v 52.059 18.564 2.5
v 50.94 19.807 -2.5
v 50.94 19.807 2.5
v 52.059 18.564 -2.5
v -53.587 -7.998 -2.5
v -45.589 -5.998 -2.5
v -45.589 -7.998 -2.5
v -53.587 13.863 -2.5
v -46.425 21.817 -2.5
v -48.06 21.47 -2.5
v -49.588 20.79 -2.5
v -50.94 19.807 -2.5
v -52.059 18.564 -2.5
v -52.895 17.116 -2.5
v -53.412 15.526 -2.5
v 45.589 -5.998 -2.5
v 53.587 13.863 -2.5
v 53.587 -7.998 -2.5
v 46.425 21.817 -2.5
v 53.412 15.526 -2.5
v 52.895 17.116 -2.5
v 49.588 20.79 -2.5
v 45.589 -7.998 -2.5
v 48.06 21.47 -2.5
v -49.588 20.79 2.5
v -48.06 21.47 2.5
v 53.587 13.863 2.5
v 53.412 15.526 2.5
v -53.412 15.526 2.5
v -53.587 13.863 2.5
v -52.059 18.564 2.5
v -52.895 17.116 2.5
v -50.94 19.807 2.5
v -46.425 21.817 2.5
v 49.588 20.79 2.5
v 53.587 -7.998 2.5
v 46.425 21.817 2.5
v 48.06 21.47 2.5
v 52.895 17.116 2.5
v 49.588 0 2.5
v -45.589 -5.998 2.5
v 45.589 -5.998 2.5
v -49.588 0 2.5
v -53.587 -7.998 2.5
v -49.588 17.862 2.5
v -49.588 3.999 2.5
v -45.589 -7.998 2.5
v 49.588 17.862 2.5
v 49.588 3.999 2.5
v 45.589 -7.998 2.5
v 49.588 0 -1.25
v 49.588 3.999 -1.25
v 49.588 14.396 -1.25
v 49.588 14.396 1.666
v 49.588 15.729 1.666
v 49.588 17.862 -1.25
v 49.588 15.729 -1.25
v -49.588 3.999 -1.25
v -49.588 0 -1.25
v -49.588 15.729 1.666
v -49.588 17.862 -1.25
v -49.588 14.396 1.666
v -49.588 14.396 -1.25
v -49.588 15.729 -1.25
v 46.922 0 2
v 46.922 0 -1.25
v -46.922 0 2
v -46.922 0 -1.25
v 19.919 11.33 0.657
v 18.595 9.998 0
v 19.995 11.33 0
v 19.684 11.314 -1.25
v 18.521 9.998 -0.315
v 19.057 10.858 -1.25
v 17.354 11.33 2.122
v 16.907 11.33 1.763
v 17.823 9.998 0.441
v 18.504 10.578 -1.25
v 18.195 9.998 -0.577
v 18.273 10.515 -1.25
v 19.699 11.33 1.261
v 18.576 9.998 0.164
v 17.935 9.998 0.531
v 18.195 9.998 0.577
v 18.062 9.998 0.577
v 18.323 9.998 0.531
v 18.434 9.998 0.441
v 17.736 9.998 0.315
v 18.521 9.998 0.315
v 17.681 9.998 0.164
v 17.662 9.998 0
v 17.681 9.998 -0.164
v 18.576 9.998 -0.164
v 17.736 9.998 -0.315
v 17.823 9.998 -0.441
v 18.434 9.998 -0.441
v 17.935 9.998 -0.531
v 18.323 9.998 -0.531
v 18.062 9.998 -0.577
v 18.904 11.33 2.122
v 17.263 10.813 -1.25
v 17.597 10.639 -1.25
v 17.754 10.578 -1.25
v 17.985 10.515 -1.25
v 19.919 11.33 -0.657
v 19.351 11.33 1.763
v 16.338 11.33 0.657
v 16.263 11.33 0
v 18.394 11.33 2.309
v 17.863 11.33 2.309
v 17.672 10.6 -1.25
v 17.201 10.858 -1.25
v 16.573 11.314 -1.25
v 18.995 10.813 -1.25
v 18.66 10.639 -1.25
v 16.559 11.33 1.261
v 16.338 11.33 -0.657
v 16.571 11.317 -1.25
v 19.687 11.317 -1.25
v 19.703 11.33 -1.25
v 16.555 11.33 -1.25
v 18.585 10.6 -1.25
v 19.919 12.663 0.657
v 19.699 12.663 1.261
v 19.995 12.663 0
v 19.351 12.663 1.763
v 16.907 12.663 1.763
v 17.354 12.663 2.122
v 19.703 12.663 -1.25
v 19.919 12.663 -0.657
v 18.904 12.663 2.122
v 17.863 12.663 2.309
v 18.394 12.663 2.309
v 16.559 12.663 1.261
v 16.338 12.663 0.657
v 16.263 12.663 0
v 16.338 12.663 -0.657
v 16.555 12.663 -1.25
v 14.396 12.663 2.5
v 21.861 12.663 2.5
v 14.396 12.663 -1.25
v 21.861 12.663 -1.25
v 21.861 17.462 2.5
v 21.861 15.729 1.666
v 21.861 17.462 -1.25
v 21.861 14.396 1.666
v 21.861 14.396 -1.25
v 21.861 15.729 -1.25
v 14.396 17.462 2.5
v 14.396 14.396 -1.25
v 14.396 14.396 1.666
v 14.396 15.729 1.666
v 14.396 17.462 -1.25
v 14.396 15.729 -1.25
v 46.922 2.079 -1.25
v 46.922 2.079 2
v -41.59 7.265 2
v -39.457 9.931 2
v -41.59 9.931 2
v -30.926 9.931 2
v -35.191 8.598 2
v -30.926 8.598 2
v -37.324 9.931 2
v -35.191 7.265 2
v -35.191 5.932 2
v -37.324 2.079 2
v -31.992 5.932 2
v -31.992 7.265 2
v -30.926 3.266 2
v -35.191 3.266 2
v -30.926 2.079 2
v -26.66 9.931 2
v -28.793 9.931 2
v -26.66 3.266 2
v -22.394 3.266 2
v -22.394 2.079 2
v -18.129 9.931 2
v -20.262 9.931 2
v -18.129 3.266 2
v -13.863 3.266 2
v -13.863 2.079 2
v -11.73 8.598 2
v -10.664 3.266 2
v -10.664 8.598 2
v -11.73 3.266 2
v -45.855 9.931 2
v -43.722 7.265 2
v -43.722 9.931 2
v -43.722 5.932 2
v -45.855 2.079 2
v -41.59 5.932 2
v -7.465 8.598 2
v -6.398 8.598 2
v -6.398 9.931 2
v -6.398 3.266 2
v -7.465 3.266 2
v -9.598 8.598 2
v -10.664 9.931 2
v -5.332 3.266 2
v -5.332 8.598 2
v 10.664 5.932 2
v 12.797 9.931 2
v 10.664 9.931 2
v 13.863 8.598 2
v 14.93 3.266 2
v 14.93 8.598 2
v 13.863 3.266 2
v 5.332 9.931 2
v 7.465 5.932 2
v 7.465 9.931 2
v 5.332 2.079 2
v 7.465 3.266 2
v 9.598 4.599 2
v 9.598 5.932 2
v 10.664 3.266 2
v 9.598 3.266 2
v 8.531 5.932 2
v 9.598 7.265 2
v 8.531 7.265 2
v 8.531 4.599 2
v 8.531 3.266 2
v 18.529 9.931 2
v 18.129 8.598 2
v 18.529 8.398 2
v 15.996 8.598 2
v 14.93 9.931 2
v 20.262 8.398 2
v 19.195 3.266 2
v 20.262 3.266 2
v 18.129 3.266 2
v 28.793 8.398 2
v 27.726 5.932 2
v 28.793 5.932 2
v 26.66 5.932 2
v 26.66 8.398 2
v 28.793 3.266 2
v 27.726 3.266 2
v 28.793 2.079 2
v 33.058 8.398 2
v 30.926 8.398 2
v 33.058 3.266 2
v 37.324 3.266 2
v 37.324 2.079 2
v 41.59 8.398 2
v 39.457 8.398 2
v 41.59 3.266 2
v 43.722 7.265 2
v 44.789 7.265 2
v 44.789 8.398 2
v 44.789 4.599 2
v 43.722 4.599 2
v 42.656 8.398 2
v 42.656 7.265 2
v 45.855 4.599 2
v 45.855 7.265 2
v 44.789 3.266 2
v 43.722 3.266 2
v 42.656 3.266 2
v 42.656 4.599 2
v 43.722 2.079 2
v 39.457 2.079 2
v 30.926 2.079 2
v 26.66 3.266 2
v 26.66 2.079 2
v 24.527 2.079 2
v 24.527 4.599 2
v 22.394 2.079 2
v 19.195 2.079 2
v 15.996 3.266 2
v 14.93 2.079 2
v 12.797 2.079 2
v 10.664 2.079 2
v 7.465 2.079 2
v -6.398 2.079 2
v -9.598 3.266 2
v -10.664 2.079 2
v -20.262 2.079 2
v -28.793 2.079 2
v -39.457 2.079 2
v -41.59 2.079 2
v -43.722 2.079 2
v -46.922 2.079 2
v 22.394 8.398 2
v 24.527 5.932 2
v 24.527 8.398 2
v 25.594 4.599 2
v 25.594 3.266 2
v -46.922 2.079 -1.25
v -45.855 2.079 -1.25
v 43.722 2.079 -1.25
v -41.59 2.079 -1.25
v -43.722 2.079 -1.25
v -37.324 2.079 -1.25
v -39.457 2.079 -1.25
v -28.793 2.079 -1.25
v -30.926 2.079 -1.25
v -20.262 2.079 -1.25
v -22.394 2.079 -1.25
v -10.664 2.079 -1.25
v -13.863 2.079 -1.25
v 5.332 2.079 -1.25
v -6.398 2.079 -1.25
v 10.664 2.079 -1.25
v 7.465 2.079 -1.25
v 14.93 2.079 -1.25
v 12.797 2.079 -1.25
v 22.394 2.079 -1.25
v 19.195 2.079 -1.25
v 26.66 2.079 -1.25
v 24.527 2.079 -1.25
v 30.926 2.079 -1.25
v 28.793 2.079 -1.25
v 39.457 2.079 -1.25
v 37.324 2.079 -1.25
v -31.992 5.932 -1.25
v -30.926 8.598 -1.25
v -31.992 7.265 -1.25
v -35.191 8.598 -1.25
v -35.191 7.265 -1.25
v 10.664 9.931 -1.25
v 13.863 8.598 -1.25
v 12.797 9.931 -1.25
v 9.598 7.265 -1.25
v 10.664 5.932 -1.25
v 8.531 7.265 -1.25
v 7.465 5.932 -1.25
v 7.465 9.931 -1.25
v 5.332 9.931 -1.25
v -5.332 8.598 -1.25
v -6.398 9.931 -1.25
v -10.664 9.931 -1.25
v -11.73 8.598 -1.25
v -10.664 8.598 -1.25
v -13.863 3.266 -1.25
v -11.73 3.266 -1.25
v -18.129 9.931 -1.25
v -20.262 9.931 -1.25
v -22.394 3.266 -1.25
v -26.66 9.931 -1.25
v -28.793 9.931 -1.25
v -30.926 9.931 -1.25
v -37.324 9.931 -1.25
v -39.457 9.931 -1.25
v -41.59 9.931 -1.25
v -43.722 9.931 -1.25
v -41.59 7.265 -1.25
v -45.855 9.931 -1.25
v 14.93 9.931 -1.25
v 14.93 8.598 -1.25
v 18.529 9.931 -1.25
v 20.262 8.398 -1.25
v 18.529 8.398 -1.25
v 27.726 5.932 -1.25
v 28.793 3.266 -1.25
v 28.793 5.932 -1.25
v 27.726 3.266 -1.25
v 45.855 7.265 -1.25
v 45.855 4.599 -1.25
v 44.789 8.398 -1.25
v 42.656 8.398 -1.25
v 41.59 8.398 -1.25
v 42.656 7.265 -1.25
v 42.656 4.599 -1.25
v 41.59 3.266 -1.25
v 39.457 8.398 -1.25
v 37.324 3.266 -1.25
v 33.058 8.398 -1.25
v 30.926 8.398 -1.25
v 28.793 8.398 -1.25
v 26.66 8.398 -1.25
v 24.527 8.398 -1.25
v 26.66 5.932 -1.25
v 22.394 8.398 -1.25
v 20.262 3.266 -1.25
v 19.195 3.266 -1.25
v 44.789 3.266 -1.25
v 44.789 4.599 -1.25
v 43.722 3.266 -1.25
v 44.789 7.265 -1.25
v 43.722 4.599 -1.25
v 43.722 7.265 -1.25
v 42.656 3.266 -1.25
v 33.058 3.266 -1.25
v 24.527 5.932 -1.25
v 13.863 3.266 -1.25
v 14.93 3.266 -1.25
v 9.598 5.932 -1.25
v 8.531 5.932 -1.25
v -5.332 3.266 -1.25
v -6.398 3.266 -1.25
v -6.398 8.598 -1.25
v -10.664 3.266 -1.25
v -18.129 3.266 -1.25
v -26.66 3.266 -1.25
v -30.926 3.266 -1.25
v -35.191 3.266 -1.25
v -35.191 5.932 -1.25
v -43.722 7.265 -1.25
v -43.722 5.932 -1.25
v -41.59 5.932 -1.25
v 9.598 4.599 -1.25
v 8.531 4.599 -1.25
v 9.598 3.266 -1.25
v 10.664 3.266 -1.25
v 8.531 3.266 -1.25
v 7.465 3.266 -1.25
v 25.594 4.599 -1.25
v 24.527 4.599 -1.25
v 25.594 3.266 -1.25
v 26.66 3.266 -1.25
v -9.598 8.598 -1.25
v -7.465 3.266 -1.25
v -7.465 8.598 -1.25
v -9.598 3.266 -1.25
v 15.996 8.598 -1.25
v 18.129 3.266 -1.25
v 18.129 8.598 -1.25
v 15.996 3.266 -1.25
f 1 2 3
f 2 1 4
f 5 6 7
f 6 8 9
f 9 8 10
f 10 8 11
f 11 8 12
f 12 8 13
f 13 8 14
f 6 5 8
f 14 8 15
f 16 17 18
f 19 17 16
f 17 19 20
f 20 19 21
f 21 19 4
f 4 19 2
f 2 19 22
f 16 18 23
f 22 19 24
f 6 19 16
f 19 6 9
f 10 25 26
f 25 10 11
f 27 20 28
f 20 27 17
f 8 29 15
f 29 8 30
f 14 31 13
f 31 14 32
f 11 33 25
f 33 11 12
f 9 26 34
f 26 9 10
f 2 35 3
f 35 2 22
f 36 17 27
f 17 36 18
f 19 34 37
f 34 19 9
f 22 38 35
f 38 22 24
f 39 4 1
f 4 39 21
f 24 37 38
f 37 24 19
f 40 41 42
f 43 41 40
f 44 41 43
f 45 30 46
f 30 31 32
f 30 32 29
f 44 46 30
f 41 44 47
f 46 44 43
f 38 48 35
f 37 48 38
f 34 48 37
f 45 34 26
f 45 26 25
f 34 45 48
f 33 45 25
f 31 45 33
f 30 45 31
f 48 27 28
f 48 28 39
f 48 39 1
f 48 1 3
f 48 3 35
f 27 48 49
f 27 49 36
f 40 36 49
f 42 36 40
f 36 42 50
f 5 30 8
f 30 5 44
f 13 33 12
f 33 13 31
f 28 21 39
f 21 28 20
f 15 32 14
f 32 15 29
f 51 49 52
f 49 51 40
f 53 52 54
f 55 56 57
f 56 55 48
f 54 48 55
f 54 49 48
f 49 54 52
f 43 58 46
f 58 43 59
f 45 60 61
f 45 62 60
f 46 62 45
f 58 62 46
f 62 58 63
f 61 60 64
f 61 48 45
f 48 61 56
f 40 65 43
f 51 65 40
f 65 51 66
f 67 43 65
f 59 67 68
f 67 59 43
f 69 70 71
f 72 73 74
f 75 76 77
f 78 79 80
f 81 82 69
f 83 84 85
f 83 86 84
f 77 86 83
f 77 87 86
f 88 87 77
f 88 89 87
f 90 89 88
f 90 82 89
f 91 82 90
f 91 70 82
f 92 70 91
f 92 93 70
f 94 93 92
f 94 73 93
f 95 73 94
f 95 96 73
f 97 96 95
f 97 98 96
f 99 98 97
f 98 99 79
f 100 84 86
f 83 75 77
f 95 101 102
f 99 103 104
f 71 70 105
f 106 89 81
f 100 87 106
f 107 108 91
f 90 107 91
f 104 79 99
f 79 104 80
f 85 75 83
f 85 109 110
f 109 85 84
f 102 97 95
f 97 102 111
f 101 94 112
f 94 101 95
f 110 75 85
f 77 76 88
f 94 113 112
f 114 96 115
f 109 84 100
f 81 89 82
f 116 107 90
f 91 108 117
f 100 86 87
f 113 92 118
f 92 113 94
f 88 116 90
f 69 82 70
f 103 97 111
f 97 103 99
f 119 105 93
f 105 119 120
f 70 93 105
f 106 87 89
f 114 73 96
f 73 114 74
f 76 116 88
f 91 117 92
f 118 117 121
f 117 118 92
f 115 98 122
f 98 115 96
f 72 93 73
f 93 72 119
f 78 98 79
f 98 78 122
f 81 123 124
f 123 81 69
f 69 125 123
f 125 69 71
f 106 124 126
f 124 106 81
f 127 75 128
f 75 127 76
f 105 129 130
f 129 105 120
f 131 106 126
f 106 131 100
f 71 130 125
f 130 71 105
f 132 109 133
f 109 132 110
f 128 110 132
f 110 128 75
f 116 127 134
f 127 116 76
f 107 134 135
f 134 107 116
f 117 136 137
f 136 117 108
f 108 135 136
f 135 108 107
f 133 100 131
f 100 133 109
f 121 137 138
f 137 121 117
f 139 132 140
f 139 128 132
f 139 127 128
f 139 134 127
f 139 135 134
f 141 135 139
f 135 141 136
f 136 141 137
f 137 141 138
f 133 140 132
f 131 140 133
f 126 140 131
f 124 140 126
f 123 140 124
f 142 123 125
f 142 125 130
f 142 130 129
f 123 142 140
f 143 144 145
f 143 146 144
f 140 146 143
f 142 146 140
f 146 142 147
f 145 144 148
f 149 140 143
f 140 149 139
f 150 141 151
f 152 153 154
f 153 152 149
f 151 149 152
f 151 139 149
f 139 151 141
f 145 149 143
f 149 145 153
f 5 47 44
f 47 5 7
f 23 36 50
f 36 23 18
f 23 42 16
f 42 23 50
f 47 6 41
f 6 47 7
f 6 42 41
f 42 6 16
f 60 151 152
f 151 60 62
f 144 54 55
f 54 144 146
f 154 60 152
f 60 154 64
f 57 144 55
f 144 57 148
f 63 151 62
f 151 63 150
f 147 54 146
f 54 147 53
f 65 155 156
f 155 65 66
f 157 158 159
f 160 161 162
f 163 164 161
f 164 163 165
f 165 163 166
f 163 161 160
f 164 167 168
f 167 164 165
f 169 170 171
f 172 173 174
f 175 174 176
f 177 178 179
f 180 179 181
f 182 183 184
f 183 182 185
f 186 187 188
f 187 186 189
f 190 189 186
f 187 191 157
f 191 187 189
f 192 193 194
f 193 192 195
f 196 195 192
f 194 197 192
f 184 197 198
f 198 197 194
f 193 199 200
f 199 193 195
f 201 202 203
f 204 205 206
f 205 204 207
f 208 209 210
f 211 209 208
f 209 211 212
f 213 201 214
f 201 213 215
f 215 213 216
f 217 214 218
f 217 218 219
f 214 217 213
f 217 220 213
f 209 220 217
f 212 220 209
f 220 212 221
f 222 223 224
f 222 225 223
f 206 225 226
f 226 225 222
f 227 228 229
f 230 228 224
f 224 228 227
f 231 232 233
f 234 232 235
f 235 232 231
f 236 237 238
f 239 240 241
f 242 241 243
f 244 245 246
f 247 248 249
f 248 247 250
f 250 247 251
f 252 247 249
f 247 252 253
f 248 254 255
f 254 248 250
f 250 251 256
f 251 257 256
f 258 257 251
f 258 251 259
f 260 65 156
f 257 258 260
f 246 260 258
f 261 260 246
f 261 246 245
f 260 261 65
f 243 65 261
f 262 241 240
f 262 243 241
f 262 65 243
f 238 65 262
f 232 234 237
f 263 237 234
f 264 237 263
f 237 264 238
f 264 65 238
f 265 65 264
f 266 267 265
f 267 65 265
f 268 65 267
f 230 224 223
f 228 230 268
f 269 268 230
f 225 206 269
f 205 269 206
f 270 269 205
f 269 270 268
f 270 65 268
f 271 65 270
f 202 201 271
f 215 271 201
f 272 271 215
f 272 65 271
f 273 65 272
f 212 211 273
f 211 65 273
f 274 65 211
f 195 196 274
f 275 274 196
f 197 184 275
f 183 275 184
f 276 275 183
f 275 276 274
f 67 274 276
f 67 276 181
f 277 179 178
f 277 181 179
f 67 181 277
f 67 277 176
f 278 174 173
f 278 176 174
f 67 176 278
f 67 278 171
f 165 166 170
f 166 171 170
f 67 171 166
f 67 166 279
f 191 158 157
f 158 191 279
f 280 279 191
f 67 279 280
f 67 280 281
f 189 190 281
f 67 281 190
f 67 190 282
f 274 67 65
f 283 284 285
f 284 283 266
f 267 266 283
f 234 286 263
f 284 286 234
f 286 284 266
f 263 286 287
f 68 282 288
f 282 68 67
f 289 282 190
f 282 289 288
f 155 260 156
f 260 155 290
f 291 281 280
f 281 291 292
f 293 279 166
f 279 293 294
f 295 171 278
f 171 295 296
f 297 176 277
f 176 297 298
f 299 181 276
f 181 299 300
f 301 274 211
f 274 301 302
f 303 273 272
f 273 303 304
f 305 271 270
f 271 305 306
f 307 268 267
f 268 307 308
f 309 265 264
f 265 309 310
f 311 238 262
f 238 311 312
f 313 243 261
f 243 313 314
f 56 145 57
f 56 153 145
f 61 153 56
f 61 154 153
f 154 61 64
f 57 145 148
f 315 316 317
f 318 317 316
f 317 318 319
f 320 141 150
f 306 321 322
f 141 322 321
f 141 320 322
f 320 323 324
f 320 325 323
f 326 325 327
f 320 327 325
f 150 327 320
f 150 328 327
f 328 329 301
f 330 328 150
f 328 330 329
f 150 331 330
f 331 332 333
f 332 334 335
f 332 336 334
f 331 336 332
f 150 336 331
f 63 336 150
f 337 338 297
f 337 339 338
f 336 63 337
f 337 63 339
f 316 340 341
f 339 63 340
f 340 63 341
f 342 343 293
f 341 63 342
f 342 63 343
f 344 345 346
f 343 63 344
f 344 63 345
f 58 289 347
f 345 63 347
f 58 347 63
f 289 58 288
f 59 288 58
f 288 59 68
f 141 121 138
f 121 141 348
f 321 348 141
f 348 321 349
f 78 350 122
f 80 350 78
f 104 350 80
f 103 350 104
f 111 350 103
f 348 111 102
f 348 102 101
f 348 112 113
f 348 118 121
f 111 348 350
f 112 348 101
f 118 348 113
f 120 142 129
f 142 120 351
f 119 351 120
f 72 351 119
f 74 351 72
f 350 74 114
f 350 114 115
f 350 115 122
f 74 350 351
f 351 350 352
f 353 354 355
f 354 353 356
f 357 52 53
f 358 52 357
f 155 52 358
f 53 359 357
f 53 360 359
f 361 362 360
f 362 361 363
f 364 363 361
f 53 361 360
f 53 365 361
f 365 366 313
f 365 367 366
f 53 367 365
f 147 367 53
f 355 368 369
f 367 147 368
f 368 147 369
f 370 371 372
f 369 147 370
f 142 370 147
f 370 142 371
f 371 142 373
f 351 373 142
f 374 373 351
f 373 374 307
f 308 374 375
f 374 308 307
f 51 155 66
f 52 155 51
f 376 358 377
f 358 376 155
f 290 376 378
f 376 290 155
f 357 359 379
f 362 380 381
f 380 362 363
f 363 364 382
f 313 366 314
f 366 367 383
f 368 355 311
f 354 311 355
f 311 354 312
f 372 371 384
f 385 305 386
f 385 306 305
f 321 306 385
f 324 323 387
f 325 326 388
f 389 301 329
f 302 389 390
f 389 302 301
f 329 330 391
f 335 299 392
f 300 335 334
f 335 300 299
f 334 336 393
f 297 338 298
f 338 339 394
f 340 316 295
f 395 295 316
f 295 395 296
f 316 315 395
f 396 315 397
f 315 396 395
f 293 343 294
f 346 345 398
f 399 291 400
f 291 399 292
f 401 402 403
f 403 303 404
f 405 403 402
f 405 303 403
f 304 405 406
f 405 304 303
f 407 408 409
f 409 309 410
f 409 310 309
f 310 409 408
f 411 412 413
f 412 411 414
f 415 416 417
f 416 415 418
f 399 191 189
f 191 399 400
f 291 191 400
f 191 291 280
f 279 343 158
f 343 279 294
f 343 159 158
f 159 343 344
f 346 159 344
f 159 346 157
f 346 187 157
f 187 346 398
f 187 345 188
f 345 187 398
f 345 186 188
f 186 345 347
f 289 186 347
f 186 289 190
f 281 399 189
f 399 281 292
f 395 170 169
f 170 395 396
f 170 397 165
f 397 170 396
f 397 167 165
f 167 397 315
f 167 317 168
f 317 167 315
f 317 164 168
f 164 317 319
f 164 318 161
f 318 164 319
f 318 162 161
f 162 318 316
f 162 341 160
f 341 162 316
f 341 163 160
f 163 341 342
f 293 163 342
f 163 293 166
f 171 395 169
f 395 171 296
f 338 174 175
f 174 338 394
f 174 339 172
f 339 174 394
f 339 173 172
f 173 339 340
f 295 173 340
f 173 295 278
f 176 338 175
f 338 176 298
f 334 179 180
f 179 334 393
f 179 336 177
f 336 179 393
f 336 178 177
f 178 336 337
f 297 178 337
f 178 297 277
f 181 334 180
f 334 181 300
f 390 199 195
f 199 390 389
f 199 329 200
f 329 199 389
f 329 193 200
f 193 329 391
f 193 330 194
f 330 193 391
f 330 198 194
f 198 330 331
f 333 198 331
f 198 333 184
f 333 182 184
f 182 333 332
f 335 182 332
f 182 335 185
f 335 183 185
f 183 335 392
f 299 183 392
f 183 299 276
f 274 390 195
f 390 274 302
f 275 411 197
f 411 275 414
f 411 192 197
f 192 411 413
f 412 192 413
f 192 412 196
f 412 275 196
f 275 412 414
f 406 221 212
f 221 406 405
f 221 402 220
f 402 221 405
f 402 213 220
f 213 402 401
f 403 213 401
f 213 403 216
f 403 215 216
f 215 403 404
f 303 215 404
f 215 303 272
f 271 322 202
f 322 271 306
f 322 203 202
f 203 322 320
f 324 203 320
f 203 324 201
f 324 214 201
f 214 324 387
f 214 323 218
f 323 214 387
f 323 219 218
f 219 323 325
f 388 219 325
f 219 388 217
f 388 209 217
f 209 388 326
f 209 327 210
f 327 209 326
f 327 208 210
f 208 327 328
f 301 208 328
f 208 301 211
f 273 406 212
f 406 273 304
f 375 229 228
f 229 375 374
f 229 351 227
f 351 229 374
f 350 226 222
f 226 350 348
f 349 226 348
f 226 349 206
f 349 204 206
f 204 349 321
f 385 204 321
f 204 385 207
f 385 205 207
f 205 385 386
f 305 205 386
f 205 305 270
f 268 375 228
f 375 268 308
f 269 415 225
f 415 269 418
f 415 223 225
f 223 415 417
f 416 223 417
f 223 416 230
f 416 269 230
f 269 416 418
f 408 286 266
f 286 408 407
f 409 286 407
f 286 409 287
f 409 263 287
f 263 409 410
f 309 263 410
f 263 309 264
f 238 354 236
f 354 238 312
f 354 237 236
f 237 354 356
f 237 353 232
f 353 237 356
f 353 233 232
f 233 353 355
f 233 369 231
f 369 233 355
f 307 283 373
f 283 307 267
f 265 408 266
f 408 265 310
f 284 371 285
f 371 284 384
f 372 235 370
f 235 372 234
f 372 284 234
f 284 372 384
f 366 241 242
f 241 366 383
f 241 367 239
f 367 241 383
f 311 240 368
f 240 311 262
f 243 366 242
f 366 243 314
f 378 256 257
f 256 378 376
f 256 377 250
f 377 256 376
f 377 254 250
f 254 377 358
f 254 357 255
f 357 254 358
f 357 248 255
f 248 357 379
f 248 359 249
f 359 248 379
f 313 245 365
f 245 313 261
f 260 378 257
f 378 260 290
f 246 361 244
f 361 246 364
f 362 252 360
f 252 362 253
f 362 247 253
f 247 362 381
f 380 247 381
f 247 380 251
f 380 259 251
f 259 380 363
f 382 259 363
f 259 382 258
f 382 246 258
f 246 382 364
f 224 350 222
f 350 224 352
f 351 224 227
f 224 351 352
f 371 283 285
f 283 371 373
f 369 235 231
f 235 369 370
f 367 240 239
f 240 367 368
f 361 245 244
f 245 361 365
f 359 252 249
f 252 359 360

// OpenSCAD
// Copyright 2013 Glen Chung
// This file is licensed Creative Commons Attribution-ShareAlike 3.0.
// http://creativecommons.org/licenses/by-sa/3.0/legalcode

use <MCAD/shapes.scad>
use <MCAD/fonts.scad>

/* [Global] */

//plate thickness
thickness = 15;

//text to be printed (at least one character)
text = "HELLO WORLD";

//horizontal space to plate boundary
text_space = 10;

//extruder x position
extruder_xpos = 68;

//extruder y position
extruder_ypos = 54;  //[25:54]

//nozzle resolution
nozzle_resolution = 6;

//enable hanging hole
enable_hole = 0; //[1:true, 0:false]

//style (hollw or single side)
style = 1; //[0:hollow,1:singleside]

//base style
base_style = 2; //[0:none, 1:solid, 2:foot]

//output
output_style = 2; //[0:text only, 1:plate only, 2:both]

/* [Hidden] */
text_font = 8bit_polyfont();
indicies = search(text,text_font[2],1,1);
width = len(indicies)*32+text_space*2;
height = 67;
round_dia = 30;
rod_height = 5;
rod_thick = 10;
extruder_width = 28;
extruder_height = 18;
extruder_thick = thickness;
nozzle_dia = 7;
nozzle_height = 10;
text_scale = [4,5,3];
build_plate_width = len(indicies)*32;
build_plate_height = 8;
hanging_hole_size = 18;
plate_color = "Grey";
text_color = "Red";
printer_color = "Silver";

scale([0.2666,0.2666,0.3333]) {

if(output_style == 1 || output_style == 2) {
	difference() {
		union() {
			//plate
			translate([0, height/2, 0])
			difference() {
				color(plate_color)
				translate([-(width-round_dia)/2, -(height-round_dia)/2, -thickness/2])
					minkowski()
					{
 						cube([width-round_dia,height-round_dia,thickness/2]);
 						cylinder(r=round_dia,h=thickness/2);
					}

				translate([-(width)/2, -(height)/2, -thickness])
					cube([width,height,thickness*2]);
			}

			//x-rod
			translate([-width/2, extruder_ypos, -rod_thick/2]) color (printer_color)
				cube([width, rod_height, rod_thick]);

			//extruder
			translate([extruder_xpos, 0, 0]) color(printer_color) {
				translate([0,extruder_ypos+rod_height/2, 0])
					translate([-extruder_width/2,-extruder_height/2,-extruder_thick/2])
					cube([extruder_width,extruder_height,extruder_thick]);

				//nozzle
				translate([0,extruder_ypos-extruder_height/2-nozzle_height/4,0])
				rotate([90,0,0]) {
					cylinder(h = nozzle_height/2, r1 = nozzle_dia, r2 = nozzle_dia/4);
					translate([0,0,-nozzle_height/2])
						cylinder(h = nozzle_height/2, r = nozzle_dia);
				}
			}


			//Build Plate
			translate([-build_plate_width/2,-0.2,-thickness/2]) color(printer_color){
				cube([build_plate_width,build_plate_height,thickness*.9]);
			}

			//hanging hole
			if(enable_hole == 1) {
				translate([0,height+round_dia/2-hanging_hole_size/10,-thickness/2])
				color(plate_color) difference() {
					cylinder(h = thickness, r=hanging_hole_size);

					translate([-hanging_hole_size,-hanging_hole_size, -thickness/2])
						cube([hanging_hole_size*2,hanging_hole_size,thickness*2]);

					translate([0,hanging_hole_size/3,-thickness/2])
					cylinder(h = thickness*2, r=hanging_hole_size/4);
				}
			}

			//style
			if(style == 1) { //single side
				translate([-(width)/2, 0, -thickness/2]) color(plate_color)
					cube([width,height,thickness/4]);
			}

			//base
			if(base_style == 1 ) {
				translate([-width/2-round_dia/2,-round_dia,-thickness/2]) color(plate_color) {
					cube([width+round_dia,round_dia,thickness]);
				}
				translate([-width/2-round_dia/2,-round_dia/2,-thickness/2]) color(plate_color) {
					cube([round_dia/2,round_dia,thickness]);
				}
				translate([width/2,-round_dia/2,-thickness/2]) color(plate_color) {
					cube([round_dia/2,round_dia,thickness]);
				}
			}

			if(base_style == 2 ) {
				difference() {
					union() {
						translate([-width/2-round_dia/2,-round_dia,-thickness/2]) color(plate_color) {
							cube([width+round_dia,round_dia,thickness]);
						}
						translate([-width/2-round_dia/2,-round_dia/2,-thickness/2]) color(plate_color) {
							cube([round_dia/2,round_dia,thickness]);
						}
						translate([width/2,-round_dia/2,-thickness/2]) color(plate_color) {
							cube([round_dia/2,round_dia,thickness]);
						}
					}

					translate([-width/2+thickness,-round_dia-round_dia/2-round_dia/4,-thickness])
						cube([width-thickness*2,round_dia,thickness*2]);
				}
			}
		}
		text();
	}
}


//text
if(output_style == 0 || output_style == 2) {
	text();
}

}


module text() {
	difference() {
		union() {
			scale(text_scale)
				translate([-len(indicies)*text_font[0][0]/2,text_font[0][1]/2+.5-.05, -3])
				{
					for(i=[0:(len(indicies)-1)] ) 
						translate([ i*text_font[0][0], -text_font[0][1]/2 ,1]) 
						{
							//color(text_color)
								linear_extrude(height=4) polygon(points=text_font[2][indicies[i]][6][0],paths=text_font[2][indicies[i]][6][1]);
						}
				}
		}

		translate([extruder_xpos+nozzle_resolution/4,extruder_ypos-extruder_height/2-nozzle_height+rod_height/2-nozzle_resolution,-thickness])
			cube([width,height,thickness*2]);
		translate([-width+extruder_xpos+nozzle_resolution/4,extruder_ypos-extruder_height/2-nozzle_height+rod_height/2,-thickness])
			cube([width,height,thickness*2]);
	}
}
